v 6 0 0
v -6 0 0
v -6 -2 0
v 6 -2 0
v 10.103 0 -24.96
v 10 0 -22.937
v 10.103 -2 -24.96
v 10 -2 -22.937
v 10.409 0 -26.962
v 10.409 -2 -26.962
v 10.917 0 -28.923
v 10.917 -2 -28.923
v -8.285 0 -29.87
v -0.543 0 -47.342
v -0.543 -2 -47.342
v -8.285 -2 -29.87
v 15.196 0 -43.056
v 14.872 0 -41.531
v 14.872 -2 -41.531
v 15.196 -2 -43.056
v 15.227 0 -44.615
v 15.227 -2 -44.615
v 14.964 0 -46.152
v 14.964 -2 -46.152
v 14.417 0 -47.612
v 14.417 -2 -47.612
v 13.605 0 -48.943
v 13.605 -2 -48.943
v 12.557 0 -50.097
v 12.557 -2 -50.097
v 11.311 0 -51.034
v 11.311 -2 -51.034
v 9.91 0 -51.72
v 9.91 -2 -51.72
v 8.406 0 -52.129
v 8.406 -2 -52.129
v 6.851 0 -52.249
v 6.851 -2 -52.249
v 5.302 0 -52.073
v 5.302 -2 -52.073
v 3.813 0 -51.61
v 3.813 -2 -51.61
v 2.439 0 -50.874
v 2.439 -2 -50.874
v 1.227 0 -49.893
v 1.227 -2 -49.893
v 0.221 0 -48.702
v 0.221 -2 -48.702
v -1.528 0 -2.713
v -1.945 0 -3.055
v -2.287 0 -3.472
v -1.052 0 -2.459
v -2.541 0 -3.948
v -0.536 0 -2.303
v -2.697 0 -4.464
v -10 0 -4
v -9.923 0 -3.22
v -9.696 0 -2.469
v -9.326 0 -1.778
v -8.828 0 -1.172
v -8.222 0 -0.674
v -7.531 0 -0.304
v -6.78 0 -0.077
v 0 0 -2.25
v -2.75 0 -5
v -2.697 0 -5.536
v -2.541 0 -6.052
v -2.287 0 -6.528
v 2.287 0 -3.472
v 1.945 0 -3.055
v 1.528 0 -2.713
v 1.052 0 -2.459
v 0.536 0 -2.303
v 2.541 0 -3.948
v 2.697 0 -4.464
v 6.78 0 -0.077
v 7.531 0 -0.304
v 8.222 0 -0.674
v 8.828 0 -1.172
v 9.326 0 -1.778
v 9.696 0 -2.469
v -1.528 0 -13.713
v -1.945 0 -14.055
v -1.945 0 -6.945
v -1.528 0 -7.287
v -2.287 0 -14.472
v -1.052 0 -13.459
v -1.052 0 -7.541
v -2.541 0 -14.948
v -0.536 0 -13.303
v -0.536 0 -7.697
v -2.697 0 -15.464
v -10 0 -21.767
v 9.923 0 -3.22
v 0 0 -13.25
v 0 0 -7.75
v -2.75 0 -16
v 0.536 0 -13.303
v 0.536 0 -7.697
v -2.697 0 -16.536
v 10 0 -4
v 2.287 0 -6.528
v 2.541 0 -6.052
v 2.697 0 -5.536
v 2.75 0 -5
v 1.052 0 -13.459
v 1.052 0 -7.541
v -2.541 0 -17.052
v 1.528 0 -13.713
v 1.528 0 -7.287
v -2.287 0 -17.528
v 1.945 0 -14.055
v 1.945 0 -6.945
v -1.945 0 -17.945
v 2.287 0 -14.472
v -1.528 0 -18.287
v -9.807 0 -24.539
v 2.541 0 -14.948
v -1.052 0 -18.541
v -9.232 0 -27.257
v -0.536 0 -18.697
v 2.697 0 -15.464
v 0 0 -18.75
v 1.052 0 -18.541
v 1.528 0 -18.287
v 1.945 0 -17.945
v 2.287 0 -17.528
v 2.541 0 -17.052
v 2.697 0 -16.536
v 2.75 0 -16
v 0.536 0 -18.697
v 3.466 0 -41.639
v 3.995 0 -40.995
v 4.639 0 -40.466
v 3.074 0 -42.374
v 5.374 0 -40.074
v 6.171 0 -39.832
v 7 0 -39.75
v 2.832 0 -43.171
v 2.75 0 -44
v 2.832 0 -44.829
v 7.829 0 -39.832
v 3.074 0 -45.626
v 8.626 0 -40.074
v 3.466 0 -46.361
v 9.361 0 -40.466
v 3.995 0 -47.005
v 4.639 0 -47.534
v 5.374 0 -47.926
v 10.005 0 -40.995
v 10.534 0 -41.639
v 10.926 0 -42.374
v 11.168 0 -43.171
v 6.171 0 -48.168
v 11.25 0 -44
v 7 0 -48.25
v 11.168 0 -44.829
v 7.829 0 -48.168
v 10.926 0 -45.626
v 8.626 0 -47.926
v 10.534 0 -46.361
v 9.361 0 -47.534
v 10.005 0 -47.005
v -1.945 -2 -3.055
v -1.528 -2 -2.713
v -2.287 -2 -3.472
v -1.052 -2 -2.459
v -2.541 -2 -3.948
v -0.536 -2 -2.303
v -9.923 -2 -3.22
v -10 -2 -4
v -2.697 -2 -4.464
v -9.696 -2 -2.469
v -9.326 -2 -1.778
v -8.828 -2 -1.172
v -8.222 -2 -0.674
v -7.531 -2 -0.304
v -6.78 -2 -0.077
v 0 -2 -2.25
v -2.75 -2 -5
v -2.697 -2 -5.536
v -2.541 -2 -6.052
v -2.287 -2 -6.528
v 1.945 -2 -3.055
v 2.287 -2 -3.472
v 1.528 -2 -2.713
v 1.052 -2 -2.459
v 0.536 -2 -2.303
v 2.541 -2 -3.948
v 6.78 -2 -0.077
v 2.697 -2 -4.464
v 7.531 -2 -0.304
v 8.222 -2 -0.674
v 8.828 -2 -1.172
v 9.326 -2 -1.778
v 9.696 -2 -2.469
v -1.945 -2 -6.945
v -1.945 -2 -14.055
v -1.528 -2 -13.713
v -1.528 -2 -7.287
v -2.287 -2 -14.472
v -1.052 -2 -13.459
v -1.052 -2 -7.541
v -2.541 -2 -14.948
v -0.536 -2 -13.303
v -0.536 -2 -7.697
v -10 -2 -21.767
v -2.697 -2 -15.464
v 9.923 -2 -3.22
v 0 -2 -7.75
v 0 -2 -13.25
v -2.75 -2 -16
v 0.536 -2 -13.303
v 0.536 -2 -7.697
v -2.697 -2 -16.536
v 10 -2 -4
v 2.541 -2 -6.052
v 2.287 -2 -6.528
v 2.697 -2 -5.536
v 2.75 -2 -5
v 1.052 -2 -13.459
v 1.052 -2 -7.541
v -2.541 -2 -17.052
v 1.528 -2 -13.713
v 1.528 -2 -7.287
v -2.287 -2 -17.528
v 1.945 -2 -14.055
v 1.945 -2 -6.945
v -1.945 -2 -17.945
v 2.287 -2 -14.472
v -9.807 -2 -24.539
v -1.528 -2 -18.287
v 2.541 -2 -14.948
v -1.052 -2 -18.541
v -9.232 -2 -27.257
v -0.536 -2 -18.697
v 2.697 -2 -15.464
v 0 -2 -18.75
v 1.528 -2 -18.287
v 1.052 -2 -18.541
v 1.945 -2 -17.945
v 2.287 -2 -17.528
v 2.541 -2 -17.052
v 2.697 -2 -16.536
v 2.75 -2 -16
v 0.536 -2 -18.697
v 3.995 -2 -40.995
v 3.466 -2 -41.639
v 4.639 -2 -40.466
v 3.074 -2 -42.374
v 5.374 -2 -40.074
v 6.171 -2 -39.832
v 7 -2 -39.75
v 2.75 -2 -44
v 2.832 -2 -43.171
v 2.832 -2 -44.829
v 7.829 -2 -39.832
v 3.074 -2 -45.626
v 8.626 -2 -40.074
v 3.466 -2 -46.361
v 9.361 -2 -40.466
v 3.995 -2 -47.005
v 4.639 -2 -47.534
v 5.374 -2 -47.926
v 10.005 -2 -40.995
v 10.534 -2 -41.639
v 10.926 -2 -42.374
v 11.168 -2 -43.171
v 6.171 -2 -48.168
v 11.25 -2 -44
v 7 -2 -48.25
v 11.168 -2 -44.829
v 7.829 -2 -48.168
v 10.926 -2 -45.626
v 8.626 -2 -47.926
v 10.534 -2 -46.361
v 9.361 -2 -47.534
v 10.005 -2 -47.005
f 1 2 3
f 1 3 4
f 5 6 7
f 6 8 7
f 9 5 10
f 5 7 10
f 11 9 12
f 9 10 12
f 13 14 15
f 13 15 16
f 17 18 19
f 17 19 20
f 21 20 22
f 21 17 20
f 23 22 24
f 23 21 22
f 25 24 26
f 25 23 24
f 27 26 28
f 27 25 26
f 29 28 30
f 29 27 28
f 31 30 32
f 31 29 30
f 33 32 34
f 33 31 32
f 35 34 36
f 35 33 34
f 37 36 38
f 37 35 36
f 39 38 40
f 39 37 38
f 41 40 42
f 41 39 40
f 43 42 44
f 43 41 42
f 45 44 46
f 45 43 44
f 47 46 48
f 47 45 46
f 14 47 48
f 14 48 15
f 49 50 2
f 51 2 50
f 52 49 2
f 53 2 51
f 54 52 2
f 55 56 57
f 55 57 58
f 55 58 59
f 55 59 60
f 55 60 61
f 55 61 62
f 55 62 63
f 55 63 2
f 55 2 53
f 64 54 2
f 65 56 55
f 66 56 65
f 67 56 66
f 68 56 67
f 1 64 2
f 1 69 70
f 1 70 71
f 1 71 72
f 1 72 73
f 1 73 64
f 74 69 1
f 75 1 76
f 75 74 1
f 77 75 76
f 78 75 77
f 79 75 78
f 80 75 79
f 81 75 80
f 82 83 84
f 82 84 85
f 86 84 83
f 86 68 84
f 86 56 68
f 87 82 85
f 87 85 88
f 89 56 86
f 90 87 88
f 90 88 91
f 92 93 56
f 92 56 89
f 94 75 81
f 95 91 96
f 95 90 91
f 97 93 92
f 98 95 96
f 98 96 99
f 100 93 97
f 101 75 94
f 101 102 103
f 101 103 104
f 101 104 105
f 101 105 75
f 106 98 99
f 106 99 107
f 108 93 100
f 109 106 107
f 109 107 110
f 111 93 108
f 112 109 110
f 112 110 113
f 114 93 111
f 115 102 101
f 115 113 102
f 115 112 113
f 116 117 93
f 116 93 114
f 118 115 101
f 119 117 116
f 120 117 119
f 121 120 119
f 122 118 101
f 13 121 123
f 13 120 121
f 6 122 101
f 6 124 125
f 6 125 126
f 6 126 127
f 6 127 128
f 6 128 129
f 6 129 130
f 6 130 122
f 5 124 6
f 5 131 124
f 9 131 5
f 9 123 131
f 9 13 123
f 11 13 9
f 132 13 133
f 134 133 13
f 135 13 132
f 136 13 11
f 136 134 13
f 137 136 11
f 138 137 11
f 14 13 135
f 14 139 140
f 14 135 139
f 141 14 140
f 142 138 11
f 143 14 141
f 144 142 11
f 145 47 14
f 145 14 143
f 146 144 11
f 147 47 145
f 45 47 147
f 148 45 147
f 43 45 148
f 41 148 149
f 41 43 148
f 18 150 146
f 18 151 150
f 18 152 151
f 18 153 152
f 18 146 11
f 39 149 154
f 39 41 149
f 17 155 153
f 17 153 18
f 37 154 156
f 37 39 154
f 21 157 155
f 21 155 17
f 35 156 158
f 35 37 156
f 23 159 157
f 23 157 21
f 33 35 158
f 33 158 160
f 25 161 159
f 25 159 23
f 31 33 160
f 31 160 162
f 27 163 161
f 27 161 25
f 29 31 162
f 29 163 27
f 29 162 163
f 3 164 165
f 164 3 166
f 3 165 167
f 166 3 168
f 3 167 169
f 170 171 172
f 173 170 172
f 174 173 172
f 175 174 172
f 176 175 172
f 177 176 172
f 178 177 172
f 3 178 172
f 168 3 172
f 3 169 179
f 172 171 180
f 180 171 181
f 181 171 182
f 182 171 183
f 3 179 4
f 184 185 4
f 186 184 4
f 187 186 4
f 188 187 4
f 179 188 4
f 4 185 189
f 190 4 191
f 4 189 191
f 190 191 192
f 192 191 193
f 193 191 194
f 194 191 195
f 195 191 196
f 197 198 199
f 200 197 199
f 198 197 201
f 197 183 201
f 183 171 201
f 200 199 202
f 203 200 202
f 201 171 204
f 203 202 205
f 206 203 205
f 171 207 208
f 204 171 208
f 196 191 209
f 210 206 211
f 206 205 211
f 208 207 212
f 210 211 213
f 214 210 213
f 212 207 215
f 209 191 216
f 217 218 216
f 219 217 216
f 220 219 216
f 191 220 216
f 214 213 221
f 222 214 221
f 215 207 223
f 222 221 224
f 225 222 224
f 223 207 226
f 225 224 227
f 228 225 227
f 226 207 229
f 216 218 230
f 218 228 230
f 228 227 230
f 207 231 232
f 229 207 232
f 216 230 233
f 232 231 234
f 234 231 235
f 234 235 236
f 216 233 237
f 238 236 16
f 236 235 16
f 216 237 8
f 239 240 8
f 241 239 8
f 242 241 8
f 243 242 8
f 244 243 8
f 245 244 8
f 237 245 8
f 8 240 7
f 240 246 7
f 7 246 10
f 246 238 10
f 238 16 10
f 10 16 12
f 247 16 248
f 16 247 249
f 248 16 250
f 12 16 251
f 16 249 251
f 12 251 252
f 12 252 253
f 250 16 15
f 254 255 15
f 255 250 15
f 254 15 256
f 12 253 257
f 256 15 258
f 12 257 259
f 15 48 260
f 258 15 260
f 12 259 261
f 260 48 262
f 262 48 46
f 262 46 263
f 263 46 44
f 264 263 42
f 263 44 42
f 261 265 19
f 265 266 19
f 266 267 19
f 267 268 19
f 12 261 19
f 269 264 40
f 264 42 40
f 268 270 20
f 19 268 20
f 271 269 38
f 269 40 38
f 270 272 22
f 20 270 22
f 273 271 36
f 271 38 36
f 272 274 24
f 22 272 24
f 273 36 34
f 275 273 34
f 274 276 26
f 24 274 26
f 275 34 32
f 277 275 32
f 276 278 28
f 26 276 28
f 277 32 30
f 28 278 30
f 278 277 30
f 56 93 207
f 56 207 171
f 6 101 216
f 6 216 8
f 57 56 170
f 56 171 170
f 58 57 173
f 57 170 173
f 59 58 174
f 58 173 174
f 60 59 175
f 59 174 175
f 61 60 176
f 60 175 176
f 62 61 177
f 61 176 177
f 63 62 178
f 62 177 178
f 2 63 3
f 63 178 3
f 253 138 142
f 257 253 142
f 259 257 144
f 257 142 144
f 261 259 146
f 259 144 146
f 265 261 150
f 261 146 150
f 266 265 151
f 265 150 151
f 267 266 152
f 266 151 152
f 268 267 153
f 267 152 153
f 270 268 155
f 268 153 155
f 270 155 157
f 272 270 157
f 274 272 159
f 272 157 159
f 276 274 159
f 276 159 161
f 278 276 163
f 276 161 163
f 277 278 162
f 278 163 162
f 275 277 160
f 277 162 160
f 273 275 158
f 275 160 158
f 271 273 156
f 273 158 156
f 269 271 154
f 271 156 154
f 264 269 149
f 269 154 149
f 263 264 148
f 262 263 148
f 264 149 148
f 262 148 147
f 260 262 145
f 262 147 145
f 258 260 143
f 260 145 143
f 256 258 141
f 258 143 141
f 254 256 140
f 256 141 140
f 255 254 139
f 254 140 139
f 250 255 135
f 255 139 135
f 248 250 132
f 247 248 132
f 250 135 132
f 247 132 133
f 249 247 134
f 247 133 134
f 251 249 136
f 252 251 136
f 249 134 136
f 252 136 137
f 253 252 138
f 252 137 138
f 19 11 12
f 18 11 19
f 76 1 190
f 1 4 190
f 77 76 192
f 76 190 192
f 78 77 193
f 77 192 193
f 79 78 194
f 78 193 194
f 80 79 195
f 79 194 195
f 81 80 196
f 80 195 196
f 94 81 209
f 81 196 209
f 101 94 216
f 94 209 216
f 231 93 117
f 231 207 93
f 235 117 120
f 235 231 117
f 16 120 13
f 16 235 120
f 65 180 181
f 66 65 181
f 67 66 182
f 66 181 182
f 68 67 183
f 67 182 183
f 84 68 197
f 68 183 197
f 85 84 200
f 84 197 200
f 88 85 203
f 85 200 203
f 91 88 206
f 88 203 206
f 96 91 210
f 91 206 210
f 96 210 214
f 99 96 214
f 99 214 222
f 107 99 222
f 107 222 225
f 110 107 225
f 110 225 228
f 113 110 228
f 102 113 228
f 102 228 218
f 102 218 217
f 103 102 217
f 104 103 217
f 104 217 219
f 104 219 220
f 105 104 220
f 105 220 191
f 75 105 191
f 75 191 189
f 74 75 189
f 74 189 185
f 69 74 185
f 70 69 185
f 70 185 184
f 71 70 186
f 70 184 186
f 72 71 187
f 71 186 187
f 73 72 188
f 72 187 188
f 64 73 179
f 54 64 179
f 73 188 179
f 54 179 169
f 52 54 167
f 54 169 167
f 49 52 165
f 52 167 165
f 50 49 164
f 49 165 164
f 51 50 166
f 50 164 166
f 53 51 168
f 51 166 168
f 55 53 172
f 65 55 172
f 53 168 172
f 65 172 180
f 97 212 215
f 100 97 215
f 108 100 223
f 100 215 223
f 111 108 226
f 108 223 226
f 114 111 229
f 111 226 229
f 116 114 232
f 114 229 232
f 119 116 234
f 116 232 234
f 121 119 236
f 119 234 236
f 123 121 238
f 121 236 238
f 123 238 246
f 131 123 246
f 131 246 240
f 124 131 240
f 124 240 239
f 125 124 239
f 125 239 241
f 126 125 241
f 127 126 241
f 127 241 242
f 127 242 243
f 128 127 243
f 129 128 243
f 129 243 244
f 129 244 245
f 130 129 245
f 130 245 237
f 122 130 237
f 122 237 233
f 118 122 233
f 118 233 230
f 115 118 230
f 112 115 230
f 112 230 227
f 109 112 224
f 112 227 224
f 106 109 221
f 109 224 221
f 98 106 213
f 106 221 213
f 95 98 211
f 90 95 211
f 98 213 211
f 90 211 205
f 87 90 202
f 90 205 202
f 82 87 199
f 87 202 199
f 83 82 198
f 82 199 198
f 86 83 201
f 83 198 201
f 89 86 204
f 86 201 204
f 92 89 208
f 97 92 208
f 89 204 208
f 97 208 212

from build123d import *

# Parameters (mm, degrees)
SKETCH1_R            = 4.25
BASE_FLANGE1_DEPTH   = 2
FILLET1_R            = 20
M5_CLEARANCE_HOLE1_D = 5.5
FILLET2_R            = 4


# Sheet-metal steps are written as plain solids
with BuildPart() as part:
    # Sketch1 → Base-Flange1 (new body)
    with BuildSketch(Plane(origin=(0, 0, 0), x_dir=(1, 0, 0), z_dir=(0, 1, 0))):
        with BuildLine():
            Line((-10, 0), (10, 0))
            Line((10, 0), (10, 26))
            Line((10, 26), (14.871793605, 41.530715601))
            ThreePointArc((14.871793605, 41.530715601), (9.910471049, 51.719563347), (-0.542628251, 47.342343349))
            Line((-0.542628251, 47.342343349), (-10, 26))
            Line((-10, 26), (-10, 0))
        make_face()
        with Locations(Location((7, 44, 0), (0, 0, 270))):
            Circle(SKETCH1_R, mode=Mode.SUBTRACT)
    extrude(amount=-BASE_FLANGE1_DEPTH)

    # Fillet1
    fillet1_edges = [part.edges().sort_by_distance(p)[0] for p in [
        (-10, -1, -26),
        (10, -1, -26),
    ]]
    fillet(fillet1_edges, radius=FILLET1_R)

    # M5 Clearance Hole1 (through all)
    with Locations(Plane(origin=(0, 0, 0), x_dir=(1, 0, 0), z_dir=(0, 1, 0))):
        with Locations((0, 16), (0, 5)):
            Hole(M5_CLEARANCE_HOLE1_D / 2)

    # Fillet2
    fillet2_edges = [part.edges().sort_by_distance(p)[0] for p in [
        (10, -1, 0),
        (-10, -1, 0),
    ]]
    fillet(fillet2_edges, radius=FILLET2_R)


solid = part.part
